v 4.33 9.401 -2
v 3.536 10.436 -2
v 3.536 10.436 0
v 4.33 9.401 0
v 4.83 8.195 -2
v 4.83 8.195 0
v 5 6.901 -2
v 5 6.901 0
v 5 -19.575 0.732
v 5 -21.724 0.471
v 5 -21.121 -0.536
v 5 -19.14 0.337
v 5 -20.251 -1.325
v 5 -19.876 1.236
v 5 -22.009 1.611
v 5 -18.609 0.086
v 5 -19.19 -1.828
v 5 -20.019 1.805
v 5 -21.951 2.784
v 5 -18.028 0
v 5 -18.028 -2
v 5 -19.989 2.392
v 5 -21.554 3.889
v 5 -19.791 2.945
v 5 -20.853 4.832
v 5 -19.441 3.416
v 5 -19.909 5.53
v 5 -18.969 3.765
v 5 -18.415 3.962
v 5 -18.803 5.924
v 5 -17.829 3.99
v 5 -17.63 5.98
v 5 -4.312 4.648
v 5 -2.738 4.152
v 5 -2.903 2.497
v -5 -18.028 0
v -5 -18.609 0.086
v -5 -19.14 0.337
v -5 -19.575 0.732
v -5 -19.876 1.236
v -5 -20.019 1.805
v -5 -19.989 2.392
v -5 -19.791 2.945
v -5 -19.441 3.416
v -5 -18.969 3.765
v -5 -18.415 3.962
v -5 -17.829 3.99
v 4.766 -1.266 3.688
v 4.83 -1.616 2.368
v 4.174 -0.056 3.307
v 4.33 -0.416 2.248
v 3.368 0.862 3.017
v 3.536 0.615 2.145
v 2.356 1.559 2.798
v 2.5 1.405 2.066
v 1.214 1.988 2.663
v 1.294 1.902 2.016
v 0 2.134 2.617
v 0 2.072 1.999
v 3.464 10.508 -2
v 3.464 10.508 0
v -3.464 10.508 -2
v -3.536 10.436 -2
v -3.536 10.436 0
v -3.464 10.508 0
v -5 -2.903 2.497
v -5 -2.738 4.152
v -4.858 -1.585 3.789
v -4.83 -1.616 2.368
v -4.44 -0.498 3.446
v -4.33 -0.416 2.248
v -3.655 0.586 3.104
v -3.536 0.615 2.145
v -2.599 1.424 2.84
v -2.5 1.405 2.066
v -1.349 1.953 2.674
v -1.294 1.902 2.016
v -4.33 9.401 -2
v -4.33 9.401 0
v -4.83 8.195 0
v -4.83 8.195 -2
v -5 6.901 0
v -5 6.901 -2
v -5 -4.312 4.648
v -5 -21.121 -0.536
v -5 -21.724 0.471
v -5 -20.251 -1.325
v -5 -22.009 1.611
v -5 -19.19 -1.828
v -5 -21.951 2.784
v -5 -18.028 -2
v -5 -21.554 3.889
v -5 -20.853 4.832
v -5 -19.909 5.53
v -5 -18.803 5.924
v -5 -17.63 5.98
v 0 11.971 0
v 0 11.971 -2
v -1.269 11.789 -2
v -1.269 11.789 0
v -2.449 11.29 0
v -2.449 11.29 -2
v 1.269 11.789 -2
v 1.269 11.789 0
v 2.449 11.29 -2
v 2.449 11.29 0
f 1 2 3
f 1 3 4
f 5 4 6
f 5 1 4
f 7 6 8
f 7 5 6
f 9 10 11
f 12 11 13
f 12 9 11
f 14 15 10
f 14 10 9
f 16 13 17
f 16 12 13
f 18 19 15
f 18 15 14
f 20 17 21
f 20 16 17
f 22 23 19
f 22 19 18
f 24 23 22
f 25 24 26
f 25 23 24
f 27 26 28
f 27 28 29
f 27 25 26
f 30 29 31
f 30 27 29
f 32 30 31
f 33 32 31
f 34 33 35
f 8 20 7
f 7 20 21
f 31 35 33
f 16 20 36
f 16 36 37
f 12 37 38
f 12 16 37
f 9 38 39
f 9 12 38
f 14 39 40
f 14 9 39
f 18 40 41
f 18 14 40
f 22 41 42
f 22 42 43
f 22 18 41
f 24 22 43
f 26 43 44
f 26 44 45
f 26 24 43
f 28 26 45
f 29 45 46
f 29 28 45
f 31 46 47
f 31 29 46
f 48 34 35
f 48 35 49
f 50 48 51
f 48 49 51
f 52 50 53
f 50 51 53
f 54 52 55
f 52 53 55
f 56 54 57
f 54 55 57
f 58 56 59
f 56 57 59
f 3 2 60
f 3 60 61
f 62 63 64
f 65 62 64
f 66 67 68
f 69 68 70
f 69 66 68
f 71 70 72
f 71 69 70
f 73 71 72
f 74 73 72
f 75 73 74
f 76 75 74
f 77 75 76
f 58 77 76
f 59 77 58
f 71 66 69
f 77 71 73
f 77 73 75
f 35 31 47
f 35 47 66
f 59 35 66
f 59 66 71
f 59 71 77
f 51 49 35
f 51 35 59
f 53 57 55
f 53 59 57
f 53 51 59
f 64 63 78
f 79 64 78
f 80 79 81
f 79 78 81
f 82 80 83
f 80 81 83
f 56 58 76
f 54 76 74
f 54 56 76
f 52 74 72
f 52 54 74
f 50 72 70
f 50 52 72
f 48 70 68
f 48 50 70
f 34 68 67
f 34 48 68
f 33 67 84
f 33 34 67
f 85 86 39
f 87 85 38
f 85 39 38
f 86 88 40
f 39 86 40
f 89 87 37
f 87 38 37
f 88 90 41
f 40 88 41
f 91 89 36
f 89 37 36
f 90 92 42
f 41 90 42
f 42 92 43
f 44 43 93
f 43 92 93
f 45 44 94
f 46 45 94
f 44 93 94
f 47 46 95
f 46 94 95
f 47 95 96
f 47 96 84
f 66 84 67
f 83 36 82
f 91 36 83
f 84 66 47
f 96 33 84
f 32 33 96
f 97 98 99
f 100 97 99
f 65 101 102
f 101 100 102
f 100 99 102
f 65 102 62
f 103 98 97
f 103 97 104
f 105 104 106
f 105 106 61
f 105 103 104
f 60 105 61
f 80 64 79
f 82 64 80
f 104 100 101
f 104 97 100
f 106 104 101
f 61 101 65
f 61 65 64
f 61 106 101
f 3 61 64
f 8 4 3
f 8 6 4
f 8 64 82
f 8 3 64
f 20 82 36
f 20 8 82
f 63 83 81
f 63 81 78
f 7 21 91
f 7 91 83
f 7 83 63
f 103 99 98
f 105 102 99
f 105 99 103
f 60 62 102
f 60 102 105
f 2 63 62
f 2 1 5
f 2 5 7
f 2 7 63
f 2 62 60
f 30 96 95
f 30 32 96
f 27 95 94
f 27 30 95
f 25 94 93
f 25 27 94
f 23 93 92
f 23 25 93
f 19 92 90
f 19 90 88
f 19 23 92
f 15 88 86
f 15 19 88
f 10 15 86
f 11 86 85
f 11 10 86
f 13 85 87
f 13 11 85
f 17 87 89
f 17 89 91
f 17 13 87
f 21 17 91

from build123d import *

# Parameters (mm, degrees)
F1_DEPTH    = 5
F2_SIZE     = 3
F3_T1_DEPTH = 12.3553390593
F3_T3_DEPTH = 13.1207993933


# Not quite as in the source:
# - a fillet or chamfer that OpenCascade refuses, or shapes differently, is made with other operations: its cross-section is extruded or revolved along the edge and cut away or added


with BuildPart() as f1:
    # F0 (on Right) → F1 (new body, symmetric)
    with BuildSketch(Plane.YZ):
        with BuildLine():
            Line((11.971969828, -2), (11.971969828, 0))
            Line((11.971969828, 0), (-18.028030172, 0))
            ThreePointArc((-18.028030172, 0), (-20.0255447559, 2.0996769133), (-17.828924084, 3.990064513))
            Line((-17.828924084, 3.990064513), (2.0717210456, 1.9990036332))
            Line((2.0717210456, 1.9990036332), (2.1335235149, 2.6167190544))
            Line((2.1335235149, 2.6167190544), (-4.3118495071, 4.6476653855))
            Line((-4.3118495071, 4.6476653855), (-17.629817996, 5.9801290259))
            ThreePointArc((-17.629817996, 5.9801290259), (-22.0230593398, 2.1993538266), (-18.028030172, -2))
            Line((-18.028030172, -2), (11.971969828, -2))
        make_face()
    extrude(amount=F1_DEPTH, both=True)

    # F2
    f2_edges = [f1.edges().sort_by_distance(p)[0] for p in [
        (5, 11.97197, -1),
        (-5, 11.97197, -1),
    ]]
    chamfer(f2_edges, length=F2_SIZE)

    # F3: fillet of radius 5 on 6 edges, made by hand

    # F3_s2 → F3_t1 (cut)
    with BuildSketch(Plane.XY.offset(-7.1776695297)):
        with BuildLine():
            ThreePointArc((-3.5355339059, 10.4364359221), (-4.6193976626, 8.814319178), (-5, 6.9009020161))
            Line((-5, 6.9009020161), (-5, 8.971969828))
            Line((-5, 8.971969828), (-3.5355339059, 10.4364359221))
        make_face()
        with BuildLine():
            ThreePointArc((0.0710678119, 11.971969828), (-1.84234935, 11.5913674906), (-3.4644660941, 10.5075037339))
            Line((-3.4644660941, 10.5075037339), (-2, 11.971969828))
            Line((-2, 11.971969828), (0.0710678119, 11.971969828))
        make_face()
        with BuildLine():
            ThreePointArc((-0.0710678119, 11.971969828), (1.84234935, 11.5913674906), (3.4644660941, 10.5075037339))
            Line((3.4644660941, 10.5075037339), (2, 11.971969828))
            Line((2, 11.971969828), (-0.0710678119, 11.971969828))
        make_face()
        with BuildLine():
            ThreePointArc((3.5355339059, 10.4364359221), (4.6193976626, 8.814319178), (5, 6.9009020161))
            Line((5, 6.9009020161), (5, 8.971969828))
            Line((5, 8.971969828), (3.5355339059, 10.4364359221))
        make_face()
    extrude(amount=F3_T1_DEPTH, mode=Mode.SUBTRACT)

    # F3_s4 → F3_t3 (cut)
    with BuildSketch(Plane(origin=(0, 0.2185507121, 2.1844134494), x_dir=(1, 0, 0), z_dir=(0, 0.099553044, 0.9950322565))):
        with BuildLine():
            ThreePointArc((-5, -3.1375776299), (-3.5355339059, 0.3979562761), (0, 1.8624223701))
            Line((0, 1.8624223701), (-5, 1.8624223701))
            Line((-5, 1.8624223701), (-5, -3.1375776299))
        make_face()
        with BuildLine():
            ThreePointArc((5, -3.1375776299), (3.5355339059, 0.3979562761), (0, 1.8624223701))
            Line((0, 1.8624223701), (5, 1.8624223701))
            Line((5, 1.8624223701), (5, -3.1375776299))
        make_face()
    extrude(amount=F3_T3_DEPTH, mode=Mode.SUBTRACT)


solid = f1.part
